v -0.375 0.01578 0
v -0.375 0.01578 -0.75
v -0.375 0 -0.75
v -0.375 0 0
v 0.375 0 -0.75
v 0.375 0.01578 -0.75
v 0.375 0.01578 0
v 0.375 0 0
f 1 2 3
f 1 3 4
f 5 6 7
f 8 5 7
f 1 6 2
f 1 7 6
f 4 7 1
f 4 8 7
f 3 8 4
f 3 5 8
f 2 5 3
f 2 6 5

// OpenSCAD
translate([-0.375, 0, 0])
rotate([0, 90, 0])
linear_extrude(height=0.75)
translate([0, 0, -0.015789473684210527])
polygon(points=[[0.75, 0], [0.75, 0.015789473684210527], [0, 0.015789473684210527], [0, 0]]);
